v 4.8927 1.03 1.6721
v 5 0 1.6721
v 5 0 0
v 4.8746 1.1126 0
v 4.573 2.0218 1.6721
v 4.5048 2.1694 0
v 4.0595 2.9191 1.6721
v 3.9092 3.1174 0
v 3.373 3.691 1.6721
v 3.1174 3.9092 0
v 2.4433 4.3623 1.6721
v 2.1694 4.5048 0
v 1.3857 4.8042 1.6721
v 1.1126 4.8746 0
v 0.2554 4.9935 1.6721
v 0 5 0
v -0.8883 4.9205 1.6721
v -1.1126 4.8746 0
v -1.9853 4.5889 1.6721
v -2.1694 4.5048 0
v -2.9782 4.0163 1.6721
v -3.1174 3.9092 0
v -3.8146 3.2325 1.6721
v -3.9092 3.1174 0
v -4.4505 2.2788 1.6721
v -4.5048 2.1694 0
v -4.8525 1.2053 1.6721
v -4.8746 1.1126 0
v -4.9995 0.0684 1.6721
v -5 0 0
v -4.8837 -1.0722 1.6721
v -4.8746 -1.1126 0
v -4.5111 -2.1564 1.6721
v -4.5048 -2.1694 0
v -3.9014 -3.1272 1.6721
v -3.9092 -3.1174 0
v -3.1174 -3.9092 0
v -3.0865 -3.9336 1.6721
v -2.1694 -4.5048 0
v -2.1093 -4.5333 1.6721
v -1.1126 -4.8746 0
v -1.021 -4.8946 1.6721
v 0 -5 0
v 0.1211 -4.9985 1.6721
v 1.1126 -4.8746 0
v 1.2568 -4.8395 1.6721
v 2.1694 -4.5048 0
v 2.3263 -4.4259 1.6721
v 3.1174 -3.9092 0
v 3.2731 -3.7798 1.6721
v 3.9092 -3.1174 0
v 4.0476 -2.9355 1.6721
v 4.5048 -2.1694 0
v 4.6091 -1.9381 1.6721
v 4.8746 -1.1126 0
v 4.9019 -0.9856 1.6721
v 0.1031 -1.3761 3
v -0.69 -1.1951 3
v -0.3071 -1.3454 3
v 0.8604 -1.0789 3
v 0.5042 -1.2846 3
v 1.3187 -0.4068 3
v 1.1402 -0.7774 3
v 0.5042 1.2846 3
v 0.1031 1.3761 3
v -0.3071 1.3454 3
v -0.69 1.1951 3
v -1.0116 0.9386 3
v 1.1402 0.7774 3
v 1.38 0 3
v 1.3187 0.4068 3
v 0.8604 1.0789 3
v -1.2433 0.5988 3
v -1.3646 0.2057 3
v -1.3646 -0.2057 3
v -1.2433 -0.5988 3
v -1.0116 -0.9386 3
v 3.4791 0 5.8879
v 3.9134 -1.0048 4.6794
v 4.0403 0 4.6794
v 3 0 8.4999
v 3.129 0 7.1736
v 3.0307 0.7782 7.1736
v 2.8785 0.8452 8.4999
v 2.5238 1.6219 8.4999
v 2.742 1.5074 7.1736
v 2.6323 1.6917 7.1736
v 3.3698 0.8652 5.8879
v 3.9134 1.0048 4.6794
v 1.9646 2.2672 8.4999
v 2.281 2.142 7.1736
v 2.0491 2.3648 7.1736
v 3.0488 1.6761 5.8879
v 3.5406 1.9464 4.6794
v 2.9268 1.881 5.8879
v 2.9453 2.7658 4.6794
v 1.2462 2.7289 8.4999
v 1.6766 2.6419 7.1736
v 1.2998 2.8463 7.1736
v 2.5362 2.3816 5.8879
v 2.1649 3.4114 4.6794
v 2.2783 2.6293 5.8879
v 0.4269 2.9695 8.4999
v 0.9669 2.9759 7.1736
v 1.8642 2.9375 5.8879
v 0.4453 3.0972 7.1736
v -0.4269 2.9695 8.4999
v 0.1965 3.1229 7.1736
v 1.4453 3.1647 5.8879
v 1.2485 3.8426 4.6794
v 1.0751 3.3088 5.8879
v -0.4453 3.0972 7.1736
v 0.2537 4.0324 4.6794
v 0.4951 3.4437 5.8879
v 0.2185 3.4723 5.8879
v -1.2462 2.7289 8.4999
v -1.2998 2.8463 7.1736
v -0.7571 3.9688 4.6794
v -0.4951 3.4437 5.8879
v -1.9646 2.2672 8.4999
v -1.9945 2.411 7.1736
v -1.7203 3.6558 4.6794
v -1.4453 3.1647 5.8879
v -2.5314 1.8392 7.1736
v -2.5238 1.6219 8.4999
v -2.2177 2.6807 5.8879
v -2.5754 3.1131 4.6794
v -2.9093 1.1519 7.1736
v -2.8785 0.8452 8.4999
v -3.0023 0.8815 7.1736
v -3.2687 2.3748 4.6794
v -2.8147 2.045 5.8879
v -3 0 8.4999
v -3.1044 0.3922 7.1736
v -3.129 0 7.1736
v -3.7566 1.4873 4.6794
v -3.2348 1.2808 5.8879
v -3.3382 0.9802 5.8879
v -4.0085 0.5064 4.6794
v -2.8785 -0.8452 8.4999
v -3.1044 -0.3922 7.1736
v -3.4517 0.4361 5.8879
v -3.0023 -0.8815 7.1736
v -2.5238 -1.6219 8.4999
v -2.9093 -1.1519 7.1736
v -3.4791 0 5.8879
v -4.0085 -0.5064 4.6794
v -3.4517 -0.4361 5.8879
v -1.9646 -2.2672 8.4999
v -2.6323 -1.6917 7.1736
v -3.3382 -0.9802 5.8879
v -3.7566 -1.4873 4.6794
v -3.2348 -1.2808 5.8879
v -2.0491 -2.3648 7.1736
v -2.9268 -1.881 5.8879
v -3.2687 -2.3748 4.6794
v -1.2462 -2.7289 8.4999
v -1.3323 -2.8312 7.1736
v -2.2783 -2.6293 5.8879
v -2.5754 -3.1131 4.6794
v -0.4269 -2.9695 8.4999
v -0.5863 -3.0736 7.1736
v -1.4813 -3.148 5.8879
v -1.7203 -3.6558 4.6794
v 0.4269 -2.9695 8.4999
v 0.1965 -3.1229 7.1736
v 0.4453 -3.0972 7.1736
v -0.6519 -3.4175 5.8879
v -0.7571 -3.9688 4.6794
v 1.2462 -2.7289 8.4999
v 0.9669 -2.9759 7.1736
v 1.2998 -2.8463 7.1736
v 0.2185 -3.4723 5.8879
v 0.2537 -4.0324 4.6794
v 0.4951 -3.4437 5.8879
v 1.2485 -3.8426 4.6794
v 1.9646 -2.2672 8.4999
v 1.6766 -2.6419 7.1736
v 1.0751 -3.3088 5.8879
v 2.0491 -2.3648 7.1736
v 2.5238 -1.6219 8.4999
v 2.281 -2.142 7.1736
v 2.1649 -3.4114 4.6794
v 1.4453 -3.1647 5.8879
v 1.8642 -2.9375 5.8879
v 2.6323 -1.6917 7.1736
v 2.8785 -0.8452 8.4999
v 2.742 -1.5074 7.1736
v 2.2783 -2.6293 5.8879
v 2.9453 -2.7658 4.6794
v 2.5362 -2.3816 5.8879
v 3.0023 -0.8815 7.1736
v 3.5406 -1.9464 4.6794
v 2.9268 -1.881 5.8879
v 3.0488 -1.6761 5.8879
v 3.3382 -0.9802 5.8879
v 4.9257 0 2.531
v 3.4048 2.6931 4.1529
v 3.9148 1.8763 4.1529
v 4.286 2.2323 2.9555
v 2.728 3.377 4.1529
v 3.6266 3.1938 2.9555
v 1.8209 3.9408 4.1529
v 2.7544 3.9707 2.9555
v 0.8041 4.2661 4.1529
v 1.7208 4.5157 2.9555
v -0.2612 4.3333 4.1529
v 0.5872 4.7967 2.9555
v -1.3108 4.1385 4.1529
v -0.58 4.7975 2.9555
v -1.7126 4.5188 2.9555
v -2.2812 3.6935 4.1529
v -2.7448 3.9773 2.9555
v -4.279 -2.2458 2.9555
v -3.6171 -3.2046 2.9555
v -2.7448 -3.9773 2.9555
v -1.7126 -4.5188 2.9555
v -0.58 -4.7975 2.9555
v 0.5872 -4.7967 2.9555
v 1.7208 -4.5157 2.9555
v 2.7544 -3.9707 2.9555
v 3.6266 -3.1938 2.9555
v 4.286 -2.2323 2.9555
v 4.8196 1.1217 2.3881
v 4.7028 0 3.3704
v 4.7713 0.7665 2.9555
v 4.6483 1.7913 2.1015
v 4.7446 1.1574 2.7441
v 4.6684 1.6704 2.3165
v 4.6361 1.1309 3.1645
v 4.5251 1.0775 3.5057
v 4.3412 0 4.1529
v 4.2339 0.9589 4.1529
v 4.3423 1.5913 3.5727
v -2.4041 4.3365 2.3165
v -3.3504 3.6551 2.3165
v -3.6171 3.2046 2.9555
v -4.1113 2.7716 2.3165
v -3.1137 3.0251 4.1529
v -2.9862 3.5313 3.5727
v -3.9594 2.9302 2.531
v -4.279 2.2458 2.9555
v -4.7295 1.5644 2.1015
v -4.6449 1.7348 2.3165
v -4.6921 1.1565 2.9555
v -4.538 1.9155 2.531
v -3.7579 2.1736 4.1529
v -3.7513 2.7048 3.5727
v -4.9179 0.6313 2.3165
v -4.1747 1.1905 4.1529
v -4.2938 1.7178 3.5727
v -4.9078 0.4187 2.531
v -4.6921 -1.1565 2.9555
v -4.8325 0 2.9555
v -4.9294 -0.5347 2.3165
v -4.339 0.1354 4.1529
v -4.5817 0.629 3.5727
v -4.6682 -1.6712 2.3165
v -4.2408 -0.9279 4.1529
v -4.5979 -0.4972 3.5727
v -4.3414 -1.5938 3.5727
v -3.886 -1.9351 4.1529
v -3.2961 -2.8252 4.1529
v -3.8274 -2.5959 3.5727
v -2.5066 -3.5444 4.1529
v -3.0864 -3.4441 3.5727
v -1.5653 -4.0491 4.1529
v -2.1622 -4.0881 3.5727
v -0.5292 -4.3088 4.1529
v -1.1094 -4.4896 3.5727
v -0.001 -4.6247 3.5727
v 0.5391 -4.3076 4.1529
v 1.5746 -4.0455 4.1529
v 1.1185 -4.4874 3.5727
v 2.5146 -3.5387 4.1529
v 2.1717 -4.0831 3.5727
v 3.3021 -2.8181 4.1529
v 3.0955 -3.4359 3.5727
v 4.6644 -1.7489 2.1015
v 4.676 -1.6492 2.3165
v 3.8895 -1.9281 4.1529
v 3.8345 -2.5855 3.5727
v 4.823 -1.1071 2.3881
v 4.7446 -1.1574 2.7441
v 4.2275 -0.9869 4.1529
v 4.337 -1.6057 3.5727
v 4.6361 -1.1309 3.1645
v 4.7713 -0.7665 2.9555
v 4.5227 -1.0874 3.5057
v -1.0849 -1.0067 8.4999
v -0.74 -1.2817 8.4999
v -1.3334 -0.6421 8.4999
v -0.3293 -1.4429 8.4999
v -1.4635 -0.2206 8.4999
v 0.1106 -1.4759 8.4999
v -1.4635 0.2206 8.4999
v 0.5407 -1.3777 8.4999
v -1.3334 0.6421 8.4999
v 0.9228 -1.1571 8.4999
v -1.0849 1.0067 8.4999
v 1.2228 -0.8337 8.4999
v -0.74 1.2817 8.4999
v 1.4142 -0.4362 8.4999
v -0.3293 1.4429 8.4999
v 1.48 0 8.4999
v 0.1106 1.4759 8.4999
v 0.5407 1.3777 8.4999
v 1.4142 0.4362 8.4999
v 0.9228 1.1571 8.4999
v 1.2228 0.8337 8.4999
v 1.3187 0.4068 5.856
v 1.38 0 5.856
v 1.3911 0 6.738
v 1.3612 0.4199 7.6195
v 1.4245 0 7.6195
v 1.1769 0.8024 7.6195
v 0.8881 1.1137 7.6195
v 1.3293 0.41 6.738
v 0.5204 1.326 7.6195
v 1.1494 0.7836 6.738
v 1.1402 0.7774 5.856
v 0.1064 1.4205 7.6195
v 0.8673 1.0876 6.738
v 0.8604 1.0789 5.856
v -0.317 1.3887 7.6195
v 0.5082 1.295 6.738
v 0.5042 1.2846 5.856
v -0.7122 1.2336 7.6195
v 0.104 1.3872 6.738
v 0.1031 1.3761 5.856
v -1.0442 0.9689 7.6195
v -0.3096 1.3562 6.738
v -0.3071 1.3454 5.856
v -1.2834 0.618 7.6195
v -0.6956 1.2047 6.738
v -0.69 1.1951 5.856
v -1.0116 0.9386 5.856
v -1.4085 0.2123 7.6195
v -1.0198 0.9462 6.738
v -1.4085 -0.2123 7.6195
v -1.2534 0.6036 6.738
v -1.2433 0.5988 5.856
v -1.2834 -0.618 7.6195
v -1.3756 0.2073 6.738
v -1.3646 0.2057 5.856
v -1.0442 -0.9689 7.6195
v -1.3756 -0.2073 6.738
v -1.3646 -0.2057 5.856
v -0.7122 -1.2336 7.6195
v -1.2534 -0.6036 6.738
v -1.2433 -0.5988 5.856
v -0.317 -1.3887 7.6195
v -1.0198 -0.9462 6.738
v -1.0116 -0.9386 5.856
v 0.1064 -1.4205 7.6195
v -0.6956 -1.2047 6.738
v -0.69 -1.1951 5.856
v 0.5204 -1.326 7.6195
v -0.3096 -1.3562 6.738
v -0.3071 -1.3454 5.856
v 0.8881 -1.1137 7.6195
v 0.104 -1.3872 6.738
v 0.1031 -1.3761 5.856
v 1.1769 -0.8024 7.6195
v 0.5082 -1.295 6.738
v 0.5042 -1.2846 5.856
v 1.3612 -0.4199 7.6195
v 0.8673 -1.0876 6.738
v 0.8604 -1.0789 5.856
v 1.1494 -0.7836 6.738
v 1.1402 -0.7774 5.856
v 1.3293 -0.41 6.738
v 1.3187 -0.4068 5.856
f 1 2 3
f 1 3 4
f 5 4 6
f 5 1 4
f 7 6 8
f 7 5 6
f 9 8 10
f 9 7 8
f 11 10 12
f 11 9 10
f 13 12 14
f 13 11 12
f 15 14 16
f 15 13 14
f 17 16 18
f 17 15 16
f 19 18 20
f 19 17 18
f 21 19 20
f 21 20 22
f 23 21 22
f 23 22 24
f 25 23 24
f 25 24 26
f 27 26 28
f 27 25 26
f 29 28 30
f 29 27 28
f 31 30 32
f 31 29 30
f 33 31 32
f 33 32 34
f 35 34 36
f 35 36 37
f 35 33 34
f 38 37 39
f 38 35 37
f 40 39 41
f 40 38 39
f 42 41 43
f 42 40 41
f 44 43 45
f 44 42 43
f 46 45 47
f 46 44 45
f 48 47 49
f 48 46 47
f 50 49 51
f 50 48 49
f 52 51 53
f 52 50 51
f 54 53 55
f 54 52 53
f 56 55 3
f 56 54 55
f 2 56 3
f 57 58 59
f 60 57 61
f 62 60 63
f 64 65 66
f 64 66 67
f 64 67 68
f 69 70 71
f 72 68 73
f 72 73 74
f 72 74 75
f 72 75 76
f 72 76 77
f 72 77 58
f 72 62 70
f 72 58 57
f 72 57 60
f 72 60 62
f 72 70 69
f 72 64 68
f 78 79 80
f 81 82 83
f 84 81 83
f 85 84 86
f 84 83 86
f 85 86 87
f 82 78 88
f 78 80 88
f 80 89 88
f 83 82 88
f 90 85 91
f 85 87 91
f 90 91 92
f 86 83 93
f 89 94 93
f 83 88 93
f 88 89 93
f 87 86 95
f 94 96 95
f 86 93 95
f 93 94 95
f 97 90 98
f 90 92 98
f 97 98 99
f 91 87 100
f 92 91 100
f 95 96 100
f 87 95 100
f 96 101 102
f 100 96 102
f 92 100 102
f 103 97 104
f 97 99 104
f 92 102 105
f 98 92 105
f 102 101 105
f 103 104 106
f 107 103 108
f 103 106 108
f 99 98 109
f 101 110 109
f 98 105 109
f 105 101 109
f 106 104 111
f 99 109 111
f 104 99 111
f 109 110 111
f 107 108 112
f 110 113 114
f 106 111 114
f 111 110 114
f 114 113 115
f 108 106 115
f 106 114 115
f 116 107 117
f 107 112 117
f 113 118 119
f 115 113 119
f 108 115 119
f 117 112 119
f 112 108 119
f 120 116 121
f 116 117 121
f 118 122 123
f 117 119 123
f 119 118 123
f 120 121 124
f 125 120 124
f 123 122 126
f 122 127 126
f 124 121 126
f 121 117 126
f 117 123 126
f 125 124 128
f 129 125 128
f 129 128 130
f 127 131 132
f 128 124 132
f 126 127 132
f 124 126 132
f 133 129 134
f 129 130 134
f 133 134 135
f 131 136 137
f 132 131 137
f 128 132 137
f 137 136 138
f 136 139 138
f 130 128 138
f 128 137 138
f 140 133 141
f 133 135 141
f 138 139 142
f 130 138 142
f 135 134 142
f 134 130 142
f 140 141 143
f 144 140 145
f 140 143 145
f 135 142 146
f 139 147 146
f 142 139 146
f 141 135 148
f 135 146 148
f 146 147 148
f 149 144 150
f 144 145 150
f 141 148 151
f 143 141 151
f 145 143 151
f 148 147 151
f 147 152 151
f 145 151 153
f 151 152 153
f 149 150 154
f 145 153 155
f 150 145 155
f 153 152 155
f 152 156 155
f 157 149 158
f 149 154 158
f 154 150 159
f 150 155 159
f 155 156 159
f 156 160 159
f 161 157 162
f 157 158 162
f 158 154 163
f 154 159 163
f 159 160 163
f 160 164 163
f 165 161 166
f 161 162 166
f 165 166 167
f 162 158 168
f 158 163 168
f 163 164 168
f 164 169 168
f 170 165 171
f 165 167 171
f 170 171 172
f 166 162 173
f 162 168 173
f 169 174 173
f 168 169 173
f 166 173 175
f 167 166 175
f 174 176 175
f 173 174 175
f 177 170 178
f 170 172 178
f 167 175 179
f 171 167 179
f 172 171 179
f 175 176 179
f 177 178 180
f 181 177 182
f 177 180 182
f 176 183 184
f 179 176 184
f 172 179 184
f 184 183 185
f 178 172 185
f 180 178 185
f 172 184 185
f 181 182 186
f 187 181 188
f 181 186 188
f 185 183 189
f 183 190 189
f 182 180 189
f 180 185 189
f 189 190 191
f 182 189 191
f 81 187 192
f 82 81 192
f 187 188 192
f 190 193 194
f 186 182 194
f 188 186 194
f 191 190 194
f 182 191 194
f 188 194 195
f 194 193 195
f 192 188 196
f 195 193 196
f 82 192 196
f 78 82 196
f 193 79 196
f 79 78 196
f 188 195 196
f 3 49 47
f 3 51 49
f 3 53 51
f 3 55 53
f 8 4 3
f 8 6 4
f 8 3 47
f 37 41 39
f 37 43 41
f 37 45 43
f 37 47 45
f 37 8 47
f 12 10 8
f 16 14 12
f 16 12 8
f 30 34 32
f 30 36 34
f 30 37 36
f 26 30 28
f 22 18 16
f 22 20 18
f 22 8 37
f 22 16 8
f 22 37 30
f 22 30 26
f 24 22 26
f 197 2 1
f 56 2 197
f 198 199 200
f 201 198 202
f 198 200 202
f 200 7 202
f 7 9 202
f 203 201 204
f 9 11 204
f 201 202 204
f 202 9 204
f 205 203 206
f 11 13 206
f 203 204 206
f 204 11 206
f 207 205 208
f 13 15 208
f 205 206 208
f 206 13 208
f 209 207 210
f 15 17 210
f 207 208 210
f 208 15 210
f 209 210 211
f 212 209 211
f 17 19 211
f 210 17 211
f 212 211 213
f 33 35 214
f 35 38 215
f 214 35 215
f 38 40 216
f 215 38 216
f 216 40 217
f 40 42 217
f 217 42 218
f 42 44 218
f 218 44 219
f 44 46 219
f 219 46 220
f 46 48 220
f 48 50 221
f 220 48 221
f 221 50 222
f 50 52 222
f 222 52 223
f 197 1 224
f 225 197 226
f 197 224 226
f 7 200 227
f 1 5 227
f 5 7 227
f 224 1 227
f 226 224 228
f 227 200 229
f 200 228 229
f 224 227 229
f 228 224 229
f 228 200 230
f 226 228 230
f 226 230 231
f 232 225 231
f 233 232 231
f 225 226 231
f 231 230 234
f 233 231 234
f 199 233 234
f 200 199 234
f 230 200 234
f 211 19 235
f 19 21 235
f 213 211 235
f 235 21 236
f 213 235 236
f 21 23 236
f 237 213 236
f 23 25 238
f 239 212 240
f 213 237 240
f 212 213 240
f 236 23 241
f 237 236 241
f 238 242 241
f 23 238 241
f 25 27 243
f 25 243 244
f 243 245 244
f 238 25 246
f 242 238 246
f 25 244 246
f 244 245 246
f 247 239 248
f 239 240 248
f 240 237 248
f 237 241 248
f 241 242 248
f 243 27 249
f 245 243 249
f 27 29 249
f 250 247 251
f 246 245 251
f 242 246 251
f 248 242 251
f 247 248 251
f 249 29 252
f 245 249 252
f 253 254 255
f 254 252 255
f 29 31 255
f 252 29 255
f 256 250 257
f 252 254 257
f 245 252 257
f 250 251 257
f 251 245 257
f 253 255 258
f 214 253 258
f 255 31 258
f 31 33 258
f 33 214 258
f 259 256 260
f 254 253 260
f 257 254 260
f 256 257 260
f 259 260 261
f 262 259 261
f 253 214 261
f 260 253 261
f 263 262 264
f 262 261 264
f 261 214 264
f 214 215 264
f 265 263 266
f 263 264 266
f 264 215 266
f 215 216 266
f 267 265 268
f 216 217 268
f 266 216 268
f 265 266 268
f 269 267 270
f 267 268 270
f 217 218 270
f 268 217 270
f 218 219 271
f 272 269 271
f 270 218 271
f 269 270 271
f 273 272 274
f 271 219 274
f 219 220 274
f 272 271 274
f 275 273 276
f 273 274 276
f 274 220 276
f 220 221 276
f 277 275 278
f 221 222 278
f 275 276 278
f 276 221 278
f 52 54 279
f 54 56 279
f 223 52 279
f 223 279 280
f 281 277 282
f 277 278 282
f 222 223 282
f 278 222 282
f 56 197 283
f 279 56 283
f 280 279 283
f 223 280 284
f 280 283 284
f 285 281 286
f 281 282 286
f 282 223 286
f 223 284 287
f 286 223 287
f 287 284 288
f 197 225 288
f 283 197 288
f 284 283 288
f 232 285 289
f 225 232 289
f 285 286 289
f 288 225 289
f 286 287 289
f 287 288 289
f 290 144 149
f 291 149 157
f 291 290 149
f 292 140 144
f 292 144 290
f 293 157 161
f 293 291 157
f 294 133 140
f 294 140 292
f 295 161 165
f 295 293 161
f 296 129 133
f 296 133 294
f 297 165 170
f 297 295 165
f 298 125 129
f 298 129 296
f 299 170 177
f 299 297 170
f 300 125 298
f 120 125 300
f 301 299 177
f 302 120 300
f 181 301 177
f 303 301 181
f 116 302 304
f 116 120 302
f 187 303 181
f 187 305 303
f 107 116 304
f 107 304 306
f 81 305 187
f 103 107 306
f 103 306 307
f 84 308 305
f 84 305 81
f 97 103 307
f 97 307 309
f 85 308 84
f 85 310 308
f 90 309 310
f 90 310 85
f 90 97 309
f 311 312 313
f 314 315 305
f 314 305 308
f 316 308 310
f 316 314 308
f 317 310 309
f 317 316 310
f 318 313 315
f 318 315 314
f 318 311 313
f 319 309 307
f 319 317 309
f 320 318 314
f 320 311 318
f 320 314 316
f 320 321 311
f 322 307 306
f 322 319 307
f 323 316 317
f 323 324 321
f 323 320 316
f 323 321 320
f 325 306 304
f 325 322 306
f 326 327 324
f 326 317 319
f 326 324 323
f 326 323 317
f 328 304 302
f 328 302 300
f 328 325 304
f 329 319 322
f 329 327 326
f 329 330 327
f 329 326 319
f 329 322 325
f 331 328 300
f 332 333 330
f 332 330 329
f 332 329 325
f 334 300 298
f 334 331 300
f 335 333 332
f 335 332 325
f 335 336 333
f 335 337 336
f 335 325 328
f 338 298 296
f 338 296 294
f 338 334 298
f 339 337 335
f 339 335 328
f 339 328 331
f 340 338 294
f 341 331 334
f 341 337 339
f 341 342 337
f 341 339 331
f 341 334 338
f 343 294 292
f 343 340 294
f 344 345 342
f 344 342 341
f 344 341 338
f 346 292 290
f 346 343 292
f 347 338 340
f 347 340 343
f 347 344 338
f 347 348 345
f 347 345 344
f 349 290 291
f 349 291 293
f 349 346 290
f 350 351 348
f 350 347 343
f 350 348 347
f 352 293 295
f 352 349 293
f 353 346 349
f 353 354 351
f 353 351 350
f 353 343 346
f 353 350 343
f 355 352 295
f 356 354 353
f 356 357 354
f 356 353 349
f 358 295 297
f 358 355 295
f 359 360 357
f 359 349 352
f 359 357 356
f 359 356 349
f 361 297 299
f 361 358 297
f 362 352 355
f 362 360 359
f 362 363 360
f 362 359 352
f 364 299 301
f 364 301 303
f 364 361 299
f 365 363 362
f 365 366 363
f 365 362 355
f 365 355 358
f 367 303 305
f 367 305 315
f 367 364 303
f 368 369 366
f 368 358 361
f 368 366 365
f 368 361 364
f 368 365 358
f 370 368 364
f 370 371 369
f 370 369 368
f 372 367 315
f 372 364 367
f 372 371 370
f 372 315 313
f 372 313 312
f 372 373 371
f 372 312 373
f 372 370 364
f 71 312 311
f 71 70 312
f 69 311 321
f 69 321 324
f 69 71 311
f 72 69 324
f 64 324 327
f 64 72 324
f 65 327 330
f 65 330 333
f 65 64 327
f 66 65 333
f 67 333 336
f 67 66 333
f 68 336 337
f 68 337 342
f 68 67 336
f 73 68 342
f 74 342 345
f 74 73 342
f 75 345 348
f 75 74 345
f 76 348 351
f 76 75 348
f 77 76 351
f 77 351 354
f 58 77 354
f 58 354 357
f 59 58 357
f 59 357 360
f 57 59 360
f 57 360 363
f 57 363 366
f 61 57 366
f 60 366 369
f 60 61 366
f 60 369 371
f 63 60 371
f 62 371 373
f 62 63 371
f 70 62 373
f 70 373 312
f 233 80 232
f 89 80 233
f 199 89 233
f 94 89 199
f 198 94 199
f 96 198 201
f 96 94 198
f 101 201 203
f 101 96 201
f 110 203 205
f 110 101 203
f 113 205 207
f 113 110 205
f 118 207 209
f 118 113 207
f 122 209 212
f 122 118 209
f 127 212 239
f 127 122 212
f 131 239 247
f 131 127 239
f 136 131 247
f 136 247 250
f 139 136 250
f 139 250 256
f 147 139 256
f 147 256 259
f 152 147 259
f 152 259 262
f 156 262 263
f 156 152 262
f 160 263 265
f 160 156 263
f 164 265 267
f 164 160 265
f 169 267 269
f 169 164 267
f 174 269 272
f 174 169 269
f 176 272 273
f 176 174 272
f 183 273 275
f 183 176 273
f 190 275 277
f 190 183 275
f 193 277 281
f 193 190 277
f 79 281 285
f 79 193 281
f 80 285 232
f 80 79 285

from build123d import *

# Parameters (mm, degrees)
F2_R     = 5
F3_DEPTH = 2
F4_SIZE  = 0.1


# Not quite as in the source:
# - a fillet or chamfer that OpenCascade refuses, or shapes differently, is made with other operations: its cross-section is extruded or revolved along the edge and cut away or added


with BuildPart() as f1:
    # F0 (on Front) → F1 (revolve)
    with BuildSketch(Plane.XZ):
        Polygon((0, 3), (0, 0), (5, 0), (5, 3), (3, 6.4998515683), (1.38, 6.4998515683), (1.38, 3), align=None)
    revolve(axis=Axis((0, 0, 4.7499257841), (0, 0, 1)))

    # F2
    f2_edges = [f1.edges().sort_by_distance(p)[0] for p in [
        (-5, 0, 3),
    ]]
    fillet(f2_edges, radius=F2_R)

    # F3 (add): a face of the model
    f3_faces = [f1.faces().sort_by_distance(p)[0] for p in [
        (-2.9151471863, 0, 6.4998515683),
    ]]
    extrude(f3_faces, amount=F3_DEPTH)

    # F4
    f4_edges = [f1.edges().sort_by_distance(p)[0] for p in [
        (-1.38, 0, 8.499852),
    ]]
    chamfer(f4_edges, length=F4_SIZE)

    # F5: fillet of radius 35 on 1 edges, made by hand

    # F5_s1 → F5_t2 (revolve, cut)
    with BuildSketch(Plane.XZ):
        with BuildLine():
            ThreePointArc((1.48, 8.4998515683), (1.405008935, 7.1788664105), (1.38, 5.8559907549))
            Line((1.38, 5.8559907549), (1.38, 8.3998515683))
            Line((1.38, 8.3998515683), (1.48, 8.4998515683))
        make_face()
    revolve(axis=Axis((0, 0, 8.3998515683), (0, 0, 1)), mode=Mode.SUBTRACT)

    # F6: fillet of radius 7.9 on 1 edges, made by hand

    # F6_s1 → F6_t2 (revolve)
    with BuildSketch(Plane.XZ):
        with BuildLine():
            ThreePointArc((3, 8.4998515683), (3.276921402, 6.5233668652), (4.0403288808, 4.6793532357))
            Line((4.0403288808, 4.6793532357), (3, 6.4998515683))
            Line((3, 6.4998515683), (3, 8.4998515683))
        make_face()
    revolve(axis=Axis((0, 0, 6.4998515683), (0, 0, 1)))


solid = f1.part
